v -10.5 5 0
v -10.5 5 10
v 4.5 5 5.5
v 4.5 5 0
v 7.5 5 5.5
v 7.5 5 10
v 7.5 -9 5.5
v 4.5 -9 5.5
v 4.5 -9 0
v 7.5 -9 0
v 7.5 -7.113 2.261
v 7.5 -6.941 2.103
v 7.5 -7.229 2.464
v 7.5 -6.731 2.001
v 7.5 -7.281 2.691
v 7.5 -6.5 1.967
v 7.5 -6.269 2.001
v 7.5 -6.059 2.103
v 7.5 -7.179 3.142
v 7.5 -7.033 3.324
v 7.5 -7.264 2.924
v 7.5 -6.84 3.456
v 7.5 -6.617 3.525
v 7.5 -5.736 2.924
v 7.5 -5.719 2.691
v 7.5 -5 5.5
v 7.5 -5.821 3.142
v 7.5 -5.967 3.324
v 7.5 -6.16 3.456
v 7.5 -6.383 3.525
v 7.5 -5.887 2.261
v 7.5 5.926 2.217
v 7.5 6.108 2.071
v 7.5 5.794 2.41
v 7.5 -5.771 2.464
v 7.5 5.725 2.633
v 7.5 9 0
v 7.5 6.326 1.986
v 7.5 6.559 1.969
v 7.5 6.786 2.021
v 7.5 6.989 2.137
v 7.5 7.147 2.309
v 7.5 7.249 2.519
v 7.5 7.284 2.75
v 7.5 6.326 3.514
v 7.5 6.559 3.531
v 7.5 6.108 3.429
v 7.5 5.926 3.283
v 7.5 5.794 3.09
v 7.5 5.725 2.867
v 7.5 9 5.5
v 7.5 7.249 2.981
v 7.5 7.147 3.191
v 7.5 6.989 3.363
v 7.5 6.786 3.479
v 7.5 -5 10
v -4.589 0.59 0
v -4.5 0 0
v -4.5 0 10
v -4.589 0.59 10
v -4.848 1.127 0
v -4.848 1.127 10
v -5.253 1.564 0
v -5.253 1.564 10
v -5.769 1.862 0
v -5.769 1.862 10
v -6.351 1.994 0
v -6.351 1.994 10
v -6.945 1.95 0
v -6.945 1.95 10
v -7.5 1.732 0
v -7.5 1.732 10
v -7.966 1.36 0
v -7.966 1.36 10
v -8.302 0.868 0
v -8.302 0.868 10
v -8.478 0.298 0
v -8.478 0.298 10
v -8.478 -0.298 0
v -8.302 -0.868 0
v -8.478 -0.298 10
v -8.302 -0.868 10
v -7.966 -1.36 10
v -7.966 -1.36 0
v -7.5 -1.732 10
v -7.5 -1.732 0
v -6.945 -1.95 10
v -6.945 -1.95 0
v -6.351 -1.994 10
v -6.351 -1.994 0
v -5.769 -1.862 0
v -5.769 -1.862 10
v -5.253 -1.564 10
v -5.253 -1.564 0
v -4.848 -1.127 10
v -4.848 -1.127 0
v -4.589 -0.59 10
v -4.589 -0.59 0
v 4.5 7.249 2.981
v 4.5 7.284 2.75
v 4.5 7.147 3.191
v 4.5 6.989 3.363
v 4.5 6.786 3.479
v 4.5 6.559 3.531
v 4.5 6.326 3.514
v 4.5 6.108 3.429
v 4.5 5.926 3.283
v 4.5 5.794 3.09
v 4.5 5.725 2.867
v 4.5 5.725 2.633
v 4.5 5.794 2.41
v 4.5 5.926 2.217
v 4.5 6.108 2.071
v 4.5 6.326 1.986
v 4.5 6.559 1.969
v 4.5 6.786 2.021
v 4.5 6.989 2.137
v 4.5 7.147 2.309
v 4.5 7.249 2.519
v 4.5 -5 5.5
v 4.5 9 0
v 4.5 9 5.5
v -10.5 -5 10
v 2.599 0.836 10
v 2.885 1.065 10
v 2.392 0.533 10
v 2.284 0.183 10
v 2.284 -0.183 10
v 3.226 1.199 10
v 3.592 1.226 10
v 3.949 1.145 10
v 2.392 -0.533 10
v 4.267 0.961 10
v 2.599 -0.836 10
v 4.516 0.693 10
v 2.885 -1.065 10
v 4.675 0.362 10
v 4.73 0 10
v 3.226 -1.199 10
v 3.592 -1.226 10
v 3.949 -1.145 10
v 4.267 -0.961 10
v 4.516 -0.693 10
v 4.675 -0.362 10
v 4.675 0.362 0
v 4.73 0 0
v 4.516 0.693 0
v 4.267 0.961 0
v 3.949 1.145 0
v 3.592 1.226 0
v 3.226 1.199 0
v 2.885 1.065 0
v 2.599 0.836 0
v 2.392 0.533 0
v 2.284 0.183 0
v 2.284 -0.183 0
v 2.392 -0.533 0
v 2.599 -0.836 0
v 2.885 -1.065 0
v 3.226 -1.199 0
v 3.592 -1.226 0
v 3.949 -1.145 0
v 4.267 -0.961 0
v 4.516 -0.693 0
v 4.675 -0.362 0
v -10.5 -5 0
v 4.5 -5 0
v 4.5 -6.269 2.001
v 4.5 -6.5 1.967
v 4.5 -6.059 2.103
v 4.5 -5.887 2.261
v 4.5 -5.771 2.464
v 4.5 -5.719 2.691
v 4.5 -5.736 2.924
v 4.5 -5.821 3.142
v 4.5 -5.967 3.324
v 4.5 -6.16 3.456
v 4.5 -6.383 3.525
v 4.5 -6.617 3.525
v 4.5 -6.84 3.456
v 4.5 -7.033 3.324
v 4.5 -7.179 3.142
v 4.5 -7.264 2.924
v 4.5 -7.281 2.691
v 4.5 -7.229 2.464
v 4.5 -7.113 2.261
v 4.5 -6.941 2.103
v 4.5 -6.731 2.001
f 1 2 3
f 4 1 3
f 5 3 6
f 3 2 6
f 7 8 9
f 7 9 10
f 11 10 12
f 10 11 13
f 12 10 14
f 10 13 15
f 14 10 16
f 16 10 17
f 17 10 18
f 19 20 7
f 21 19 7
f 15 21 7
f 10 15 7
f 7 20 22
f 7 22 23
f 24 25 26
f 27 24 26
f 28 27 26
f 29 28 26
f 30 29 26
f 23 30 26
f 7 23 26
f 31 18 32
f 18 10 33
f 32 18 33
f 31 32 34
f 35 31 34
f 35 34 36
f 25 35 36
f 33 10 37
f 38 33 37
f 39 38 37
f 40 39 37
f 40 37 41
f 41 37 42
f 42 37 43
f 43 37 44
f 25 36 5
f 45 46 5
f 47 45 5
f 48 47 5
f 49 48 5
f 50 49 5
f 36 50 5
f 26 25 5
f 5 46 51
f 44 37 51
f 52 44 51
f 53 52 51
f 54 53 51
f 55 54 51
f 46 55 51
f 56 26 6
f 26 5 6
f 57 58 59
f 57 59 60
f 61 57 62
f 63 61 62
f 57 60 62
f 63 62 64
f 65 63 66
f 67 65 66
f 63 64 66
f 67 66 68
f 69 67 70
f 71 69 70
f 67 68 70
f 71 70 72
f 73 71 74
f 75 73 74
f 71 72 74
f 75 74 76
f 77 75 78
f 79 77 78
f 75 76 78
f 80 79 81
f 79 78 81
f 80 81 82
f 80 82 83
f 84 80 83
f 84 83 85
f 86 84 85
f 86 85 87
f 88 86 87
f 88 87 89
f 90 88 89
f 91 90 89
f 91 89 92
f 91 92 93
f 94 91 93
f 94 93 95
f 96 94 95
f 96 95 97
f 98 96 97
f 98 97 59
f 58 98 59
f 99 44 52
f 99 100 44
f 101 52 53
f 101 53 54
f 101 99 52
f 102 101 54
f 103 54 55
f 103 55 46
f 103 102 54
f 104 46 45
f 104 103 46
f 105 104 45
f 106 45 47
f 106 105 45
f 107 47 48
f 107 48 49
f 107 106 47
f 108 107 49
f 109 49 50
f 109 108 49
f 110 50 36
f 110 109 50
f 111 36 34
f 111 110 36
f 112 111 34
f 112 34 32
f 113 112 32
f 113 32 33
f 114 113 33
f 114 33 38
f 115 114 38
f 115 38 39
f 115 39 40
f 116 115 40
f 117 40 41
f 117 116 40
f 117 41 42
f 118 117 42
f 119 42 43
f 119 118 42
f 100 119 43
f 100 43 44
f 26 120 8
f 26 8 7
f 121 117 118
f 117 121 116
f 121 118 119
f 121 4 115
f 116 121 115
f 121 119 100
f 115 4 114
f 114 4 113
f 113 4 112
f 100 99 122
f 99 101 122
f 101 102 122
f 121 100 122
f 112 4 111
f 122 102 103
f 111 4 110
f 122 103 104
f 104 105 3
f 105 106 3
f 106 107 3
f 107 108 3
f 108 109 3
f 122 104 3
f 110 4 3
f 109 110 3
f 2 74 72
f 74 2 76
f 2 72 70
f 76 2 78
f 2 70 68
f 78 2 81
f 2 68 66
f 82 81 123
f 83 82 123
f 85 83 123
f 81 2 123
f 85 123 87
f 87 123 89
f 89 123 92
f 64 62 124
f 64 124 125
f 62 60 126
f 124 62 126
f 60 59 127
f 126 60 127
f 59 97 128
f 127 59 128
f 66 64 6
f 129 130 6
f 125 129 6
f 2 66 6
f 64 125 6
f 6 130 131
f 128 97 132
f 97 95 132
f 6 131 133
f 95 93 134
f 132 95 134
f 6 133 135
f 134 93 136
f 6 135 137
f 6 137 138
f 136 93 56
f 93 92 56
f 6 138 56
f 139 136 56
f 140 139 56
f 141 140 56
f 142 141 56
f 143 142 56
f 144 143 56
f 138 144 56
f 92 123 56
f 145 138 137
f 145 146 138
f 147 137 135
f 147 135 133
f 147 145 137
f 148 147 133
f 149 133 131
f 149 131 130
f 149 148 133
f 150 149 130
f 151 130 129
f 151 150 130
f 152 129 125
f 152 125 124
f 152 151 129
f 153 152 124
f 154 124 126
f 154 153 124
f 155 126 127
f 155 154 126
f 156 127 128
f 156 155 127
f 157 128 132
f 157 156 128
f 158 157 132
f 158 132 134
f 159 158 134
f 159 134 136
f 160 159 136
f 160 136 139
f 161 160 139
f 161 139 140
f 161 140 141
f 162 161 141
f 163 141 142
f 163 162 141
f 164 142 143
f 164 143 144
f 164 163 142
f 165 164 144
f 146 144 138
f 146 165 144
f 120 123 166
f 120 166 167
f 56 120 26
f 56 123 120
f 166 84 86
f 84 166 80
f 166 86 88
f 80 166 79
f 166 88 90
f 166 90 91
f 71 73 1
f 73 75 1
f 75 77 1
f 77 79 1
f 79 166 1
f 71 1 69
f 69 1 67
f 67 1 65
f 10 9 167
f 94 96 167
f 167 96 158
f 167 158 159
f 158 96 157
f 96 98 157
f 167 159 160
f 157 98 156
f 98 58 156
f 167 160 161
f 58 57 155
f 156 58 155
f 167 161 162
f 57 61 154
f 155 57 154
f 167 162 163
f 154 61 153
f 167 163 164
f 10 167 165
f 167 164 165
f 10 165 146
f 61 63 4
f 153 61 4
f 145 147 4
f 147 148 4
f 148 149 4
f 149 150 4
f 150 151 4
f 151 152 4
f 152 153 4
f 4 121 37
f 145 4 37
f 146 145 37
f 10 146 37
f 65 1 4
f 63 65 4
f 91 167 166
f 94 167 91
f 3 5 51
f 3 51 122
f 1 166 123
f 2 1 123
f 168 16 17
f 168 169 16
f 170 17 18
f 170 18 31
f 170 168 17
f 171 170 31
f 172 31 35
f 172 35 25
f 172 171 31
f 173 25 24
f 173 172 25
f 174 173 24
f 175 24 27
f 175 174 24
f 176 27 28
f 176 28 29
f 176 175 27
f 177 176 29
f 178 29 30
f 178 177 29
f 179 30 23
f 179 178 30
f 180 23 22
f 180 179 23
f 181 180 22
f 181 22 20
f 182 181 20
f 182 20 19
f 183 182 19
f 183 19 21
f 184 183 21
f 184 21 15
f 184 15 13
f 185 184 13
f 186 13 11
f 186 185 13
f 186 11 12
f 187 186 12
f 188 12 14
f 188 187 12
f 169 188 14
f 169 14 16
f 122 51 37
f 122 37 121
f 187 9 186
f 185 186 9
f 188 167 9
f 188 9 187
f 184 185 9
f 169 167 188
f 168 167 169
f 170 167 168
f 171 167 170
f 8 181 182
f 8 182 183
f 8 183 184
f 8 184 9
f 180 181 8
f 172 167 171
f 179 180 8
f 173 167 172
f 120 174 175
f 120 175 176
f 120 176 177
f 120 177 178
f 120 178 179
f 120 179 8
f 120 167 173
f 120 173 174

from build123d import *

# Parameters (mm, degrees)
SKETCH1_W                = 18
SKETCH1_H                = 10
BOSS_EXTRUDE1_DEPTH      = 10
SKETCH2_W                = 3
SKETCH2_H                = 5.5
BOSS_EXTRUDE2_DEPTH      = 4
SKETCH3_W                = 3
SKETCH3_H                = 5.5
BOSS_EXTRUDE3_DEPTH      = 4
F_4_0_4_DIAMETER_HOLE1_D = 4


with BuildPart() as part:
    # Sketch1 → Boss-Extrude1 (new body)
    with BuildSketch(Plane.XZ.offset(5)):
        with Locations((-1.5, 5)):
            Rectangle(SKETCH1_W, SKETCH1_H)
    extrude(amount=-BOSS_EXTRUDE1_DEPTH)

    # Sketch2 → Boss-Extrude2 (add)
    with BuildSketch(Plane(origin=(0, 5, 0), x_dir=(-1, 0, 0), z_dir=(0, 1, 0))):
        with Locations((-6, 2.75)):
            Rectangle(SKETCH2_W, SKETCH2_H)
    extrude(amount=BOSS_EXTRUDE2_DEPTH)

    # Sketch3 → Boss-Extrude3 (add)
    with BuildSketch(Plane.XZ.offset(5)):
        with Locations((6, 2.75)):
            Rectangle(SKETCH3_W, SKETCH3_H)
    extrude(amount=BOSS_EXTRUDE3_DEPTH)

    # Sketch4 → Cut-Revolve1 (revolve, cut)
    with BuildSketch(Plane.XY.offset(2.75)):
        Polygon((4.5, 7.2835), (4.5, 6.5), (7.5, 6.5), (7.5, 7.2835), (5.5, 7.2835), align=None)
    revolve(axis=Axis((4.5, 6.5, 2.75), (1, 0, 0)), mode=Mode.SUBTRACT)

    # Sketch5 → Cut-Revolve2 (revolve, cut)
    with BuildSketch(Plane.XY.offset(2.75), mode=Mode.PRIVATE) as cut_revolve2_sk:
        Polygon((4.5, -5.7165), (4.5, -6.5), (7.5, -6.5), (7.5, -5.7165), (5.5, -5.7165), align=None)
    revolve(cut_revolve2_sk.sketch.rotate(Axis((4.5, -6.5, 2.75), (1, 0, 0)), 270), axis=Axis((4.5, -6.5, 2.75), (1, 0, 0)), mode=Mode.SUBTRACT)

    # Sketch6 → Cut-Revolve3 (revolve, cut)
    with BuildSketch(Plane(origin=(0, 0, 0), x_dir=(1, 0, 0), z_dir=(0, 1, 0))):
        Polygon((4.7295, 0), (3.5, 0), (3.5, -10), (4.7295, -10), (4.7295, -8), align=None)
    revolve(axis=Axis((3.5, 0, 0), (0, 0, 1)), mode=Mode.SUBTRACT)

    # Ø4.0 (4) Diameter Hole1 (through all)
    with Locations(Plane(origin=(0, 0, 0), x_dir=(-1, 0, 0), z_dir=(0, 0, -1))):
        with Locations((6.5, 0)):
            Hole(F_4_0_4_DIAMETER_HOLE1_D / 2)


solid = part.part
